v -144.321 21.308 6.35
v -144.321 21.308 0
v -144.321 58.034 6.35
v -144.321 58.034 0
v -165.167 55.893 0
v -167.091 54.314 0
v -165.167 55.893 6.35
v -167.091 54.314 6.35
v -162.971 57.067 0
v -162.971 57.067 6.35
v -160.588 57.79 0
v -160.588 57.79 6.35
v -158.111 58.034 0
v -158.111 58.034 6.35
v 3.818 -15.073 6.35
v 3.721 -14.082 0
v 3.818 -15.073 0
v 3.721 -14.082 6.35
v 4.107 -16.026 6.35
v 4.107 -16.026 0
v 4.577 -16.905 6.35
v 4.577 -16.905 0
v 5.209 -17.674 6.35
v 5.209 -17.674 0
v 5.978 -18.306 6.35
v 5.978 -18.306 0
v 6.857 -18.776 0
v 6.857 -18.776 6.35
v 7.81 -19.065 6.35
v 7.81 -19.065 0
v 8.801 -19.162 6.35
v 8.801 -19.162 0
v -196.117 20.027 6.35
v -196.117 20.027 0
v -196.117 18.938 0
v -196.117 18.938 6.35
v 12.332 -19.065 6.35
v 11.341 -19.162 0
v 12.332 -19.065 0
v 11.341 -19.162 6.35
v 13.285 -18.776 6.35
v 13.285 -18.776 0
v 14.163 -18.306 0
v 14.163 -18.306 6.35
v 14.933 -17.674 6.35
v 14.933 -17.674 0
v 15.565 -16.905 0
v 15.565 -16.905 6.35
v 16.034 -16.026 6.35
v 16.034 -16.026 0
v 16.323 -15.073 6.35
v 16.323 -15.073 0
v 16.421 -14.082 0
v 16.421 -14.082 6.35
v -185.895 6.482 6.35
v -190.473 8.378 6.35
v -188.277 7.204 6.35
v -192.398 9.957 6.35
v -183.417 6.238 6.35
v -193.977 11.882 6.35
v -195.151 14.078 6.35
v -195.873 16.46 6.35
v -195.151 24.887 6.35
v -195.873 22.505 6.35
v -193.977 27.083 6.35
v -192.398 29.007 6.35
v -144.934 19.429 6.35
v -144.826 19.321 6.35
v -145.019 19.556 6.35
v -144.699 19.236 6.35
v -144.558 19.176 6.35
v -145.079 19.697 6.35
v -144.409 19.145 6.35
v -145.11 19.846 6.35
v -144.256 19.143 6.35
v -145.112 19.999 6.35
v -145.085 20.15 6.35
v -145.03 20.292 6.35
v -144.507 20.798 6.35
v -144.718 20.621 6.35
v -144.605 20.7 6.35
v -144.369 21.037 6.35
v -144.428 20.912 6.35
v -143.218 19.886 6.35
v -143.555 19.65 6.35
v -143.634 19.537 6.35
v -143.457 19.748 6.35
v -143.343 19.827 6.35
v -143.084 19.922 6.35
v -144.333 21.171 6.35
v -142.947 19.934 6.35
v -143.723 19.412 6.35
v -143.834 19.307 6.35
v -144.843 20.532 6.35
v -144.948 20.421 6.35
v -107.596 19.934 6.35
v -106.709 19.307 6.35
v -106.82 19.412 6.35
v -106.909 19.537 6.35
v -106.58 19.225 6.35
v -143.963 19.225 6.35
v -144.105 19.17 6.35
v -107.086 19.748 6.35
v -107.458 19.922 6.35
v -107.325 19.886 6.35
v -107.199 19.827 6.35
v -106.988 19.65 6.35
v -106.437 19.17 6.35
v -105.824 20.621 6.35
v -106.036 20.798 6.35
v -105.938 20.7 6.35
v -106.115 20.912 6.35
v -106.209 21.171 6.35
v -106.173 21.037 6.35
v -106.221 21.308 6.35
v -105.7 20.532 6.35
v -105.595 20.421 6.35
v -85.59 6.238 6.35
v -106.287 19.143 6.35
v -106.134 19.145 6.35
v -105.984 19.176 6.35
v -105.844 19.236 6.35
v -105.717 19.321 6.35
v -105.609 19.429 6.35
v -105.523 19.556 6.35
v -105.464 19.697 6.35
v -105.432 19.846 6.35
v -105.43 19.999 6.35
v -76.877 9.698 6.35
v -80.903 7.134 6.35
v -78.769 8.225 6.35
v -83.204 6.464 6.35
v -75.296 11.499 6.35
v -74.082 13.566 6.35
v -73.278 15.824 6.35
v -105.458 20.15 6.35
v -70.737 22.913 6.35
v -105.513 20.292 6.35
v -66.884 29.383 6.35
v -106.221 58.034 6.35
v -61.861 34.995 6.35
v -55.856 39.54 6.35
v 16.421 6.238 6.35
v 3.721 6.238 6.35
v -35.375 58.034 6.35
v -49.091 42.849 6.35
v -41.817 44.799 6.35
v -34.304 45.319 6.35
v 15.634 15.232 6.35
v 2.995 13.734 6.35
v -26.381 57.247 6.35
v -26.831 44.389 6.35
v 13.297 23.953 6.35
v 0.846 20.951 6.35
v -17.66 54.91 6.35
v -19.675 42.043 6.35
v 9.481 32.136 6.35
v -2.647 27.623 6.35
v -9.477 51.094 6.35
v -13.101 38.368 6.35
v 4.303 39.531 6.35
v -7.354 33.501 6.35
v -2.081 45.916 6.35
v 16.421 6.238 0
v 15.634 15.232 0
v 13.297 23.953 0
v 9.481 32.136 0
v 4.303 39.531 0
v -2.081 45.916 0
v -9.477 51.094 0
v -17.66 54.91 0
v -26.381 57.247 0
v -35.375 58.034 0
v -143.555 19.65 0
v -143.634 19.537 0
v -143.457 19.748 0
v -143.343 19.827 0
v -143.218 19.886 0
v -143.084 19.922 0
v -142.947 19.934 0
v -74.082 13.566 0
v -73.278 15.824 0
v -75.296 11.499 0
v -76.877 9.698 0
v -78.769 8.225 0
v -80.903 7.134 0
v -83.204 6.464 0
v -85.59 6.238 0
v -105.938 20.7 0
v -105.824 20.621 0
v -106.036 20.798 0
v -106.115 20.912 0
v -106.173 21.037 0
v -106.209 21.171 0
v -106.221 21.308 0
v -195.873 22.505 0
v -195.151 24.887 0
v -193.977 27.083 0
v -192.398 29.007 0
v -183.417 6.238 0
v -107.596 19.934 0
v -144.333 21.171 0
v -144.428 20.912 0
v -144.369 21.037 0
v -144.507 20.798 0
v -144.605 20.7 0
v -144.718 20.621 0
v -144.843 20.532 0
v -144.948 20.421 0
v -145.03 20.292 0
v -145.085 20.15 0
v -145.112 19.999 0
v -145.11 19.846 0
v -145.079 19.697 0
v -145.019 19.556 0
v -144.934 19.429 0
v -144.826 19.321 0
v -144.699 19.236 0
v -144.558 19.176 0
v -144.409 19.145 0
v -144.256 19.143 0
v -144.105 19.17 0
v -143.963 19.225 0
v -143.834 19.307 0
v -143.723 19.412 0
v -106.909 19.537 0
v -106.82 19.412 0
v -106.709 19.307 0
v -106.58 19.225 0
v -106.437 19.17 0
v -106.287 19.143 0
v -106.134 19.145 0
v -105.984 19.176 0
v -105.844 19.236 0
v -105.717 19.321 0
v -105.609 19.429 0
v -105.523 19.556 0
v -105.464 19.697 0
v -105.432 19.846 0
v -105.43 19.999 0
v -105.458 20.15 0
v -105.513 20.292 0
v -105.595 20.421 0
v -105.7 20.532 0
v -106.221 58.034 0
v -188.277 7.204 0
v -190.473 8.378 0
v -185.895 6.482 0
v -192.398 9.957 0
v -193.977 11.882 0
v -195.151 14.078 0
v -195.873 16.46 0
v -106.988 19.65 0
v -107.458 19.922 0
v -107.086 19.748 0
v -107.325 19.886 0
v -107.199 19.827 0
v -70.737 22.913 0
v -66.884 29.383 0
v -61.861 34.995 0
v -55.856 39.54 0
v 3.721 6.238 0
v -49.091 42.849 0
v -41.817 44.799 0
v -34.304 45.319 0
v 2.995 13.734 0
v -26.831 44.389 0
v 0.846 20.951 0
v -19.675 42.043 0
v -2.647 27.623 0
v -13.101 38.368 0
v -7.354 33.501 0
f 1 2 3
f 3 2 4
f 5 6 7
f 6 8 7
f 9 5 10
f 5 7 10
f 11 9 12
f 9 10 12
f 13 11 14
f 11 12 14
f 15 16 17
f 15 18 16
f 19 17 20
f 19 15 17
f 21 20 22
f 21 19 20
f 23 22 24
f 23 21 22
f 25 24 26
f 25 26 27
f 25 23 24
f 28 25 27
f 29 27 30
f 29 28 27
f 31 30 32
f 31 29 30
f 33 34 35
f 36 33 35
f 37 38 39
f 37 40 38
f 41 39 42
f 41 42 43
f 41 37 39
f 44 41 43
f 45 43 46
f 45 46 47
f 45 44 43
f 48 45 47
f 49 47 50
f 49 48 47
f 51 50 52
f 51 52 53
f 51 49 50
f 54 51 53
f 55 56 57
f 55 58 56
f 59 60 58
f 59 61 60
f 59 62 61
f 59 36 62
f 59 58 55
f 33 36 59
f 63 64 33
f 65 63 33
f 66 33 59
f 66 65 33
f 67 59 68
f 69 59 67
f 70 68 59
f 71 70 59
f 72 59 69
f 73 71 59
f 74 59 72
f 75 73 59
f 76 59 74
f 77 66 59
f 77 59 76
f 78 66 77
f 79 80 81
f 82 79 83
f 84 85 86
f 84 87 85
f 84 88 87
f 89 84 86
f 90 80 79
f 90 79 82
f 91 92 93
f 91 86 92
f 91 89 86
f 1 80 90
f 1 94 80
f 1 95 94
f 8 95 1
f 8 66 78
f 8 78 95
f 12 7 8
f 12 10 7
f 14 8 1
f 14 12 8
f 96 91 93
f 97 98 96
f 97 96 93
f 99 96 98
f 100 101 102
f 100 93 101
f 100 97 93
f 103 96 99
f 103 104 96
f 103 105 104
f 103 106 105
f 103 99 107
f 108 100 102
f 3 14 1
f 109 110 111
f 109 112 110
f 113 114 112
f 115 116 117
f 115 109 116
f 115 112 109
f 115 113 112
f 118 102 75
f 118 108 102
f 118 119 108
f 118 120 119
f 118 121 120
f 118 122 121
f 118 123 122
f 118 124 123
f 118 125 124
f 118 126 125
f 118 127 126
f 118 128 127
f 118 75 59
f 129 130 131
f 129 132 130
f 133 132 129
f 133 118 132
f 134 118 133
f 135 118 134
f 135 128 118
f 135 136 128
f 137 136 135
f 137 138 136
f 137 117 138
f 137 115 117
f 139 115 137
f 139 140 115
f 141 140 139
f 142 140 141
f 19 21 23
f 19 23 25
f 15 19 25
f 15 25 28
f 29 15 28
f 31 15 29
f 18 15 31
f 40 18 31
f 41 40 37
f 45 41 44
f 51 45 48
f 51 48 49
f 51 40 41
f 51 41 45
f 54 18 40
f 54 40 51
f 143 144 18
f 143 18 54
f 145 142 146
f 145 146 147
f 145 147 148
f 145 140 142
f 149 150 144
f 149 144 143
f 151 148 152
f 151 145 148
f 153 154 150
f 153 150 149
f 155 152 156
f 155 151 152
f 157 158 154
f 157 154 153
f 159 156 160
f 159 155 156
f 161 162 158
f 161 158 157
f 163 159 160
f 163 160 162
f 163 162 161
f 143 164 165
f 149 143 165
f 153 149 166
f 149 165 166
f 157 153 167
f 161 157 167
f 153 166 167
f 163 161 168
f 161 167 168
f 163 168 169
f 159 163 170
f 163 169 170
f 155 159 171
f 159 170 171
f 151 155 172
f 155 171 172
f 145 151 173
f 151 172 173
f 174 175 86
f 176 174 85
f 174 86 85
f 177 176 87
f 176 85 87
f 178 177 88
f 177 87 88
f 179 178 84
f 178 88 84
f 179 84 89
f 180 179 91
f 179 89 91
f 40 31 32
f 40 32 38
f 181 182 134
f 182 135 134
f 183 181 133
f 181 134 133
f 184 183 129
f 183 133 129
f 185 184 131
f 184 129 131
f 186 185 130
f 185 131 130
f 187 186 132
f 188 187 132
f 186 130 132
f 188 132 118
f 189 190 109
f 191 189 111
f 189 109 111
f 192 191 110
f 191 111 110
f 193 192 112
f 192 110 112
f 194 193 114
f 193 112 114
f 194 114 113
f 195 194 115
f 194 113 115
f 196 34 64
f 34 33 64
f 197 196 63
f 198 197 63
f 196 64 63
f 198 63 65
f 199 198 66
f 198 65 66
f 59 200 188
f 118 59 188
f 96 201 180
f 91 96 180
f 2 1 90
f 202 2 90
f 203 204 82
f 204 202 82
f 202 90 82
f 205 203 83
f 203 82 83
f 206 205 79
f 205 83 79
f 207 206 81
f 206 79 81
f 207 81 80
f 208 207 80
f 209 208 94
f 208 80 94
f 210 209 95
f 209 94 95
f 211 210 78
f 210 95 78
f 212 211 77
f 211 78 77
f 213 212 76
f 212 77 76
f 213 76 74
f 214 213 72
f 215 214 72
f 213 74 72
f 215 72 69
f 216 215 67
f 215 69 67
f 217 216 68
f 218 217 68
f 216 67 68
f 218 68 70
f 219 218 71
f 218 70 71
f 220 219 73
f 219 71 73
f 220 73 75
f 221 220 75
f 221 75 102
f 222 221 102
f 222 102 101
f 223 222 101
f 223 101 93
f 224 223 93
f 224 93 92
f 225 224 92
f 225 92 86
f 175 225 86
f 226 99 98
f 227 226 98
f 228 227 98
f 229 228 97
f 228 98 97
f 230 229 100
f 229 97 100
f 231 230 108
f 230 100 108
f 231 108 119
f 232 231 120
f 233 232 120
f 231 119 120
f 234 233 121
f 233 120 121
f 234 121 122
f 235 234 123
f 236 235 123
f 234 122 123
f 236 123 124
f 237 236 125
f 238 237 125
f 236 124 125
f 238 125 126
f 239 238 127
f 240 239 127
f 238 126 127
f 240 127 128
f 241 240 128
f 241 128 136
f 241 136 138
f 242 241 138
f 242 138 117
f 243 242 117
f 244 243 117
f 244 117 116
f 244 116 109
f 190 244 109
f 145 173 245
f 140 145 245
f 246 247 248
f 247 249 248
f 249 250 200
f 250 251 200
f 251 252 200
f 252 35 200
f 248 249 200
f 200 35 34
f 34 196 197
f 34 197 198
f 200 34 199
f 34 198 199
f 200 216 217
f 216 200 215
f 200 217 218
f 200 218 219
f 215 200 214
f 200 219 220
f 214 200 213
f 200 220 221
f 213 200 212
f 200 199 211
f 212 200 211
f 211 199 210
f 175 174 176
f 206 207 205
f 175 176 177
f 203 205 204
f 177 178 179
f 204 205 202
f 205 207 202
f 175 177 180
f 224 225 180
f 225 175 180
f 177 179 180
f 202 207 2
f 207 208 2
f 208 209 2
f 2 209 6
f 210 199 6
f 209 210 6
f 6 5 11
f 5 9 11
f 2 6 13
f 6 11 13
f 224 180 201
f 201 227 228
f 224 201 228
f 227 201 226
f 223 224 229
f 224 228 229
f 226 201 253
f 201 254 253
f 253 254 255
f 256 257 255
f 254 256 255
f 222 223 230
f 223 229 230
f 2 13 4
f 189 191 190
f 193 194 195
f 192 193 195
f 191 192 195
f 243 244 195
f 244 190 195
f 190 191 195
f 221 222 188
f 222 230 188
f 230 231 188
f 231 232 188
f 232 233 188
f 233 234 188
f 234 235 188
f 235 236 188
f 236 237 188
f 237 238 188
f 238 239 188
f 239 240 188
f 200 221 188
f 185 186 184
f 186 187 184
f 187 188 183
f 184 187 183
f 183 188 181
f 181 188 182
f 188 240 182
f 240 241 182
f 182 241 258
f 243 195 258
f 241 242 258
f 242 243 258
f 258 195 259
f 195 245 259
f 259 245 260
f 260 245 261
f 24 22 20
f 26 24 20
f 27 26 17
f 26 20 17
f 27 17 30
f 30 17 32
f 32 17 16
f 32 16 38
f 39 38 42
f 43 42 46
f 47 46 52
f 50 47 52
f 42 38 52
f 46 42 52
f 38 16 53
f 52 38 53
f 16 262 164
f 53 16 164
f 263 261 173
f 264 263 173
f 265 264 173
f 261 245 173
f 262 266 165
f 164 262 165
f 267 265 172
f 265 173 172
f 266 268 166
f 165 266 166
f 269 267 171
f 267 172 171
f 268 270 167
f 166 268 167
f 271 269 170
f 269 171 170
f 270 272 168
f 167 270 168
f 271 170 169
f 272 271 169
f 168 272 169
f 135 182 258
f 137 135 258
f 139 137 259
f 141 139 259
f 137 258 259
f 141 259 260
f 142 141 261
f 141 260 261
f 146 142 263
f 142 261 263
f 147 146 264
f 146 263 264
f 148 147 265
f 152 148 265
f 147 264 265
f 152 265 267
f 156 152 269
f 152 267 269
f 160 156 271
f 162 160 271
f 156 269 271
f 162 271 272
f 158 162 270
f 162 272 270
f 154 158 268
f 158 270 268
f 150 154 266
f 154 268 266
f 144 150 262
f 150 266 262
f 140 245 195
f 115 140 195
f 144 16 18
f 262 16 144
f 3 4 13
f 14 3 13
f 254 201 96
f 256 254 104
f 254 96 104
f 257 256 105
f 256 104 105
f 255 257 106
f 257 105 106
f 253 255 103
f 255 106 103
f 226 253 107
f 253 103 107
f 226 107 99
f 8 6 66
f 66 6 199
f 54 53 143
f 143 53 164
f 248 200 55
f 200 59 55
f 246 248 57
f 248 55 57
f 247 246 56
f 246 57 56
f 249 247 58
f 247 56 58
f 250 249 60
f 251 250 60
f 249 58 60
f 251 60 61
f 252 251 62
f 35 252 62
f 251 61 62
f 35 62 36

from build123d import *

# Parameters (mm, degrees)
F0_W     = 12.7
F0_H     = 25.4
F1_DEPTH = 6.35
F2_R     = 5.08
F3_R     = 12.7
F5_DEPTH = 6.351


with BuildPart() as f1:
    # F0 (on Top) → F1 (new body)
    with BuildSketch(Plane.XY):
        with BuildLine():
            Line((-87.171328, 6.23762), (-74.471328, 6.23762))
            ThreePointArc((-74.471328, 6.23762), (-35.375303, 45.333645), (3.720721, 6.23762))
            Line((3.720721, 6.23762), (16.420721, 6.23762))
            ThreePointArc((16.420721, 6.23762), (1.250017, 42.862941), (-35.375303, 58.033645))
            Line((-35.375303, 58.033645), (-106.221328, 58.033645))
            Line((-106.221328, 58.033645), (-106.221328, 19.933645))
            Line((-106.221328, 19.933645), (-144.321328, 19.933645))
            Line((-144.321328, 19.933645), (-144.321328, 58.033645))
            Line((-144.321328, 58.033645), (-163.371328, 58.033645))
            Line((-163.371328, 58.033645), (-196.117352, 25.28762))
            Line((-196.117352, 25.28762), (-196.117352, 6.23762))
            Line((-196.117352, 6.23762), (-87.171328, 6.23762))
        make_face()
        with Locations((10.070721, -6.46238)):
            Rectangle(F0_W, F0_H)
    extrude(amount=F1_DEPTH)

    # F2
    f2_edges = [f1.edges().sort_by_distance(p)[0] for p in [
        (16.420721, -19.16238, 3.175),
        (3.720721, -19.16238, 3.175),
    ]]
    fillet(f2_edges, radius=F2_R)

    # F3
    f3_edges = [f1.edges().sort_by_distance(p)[0] for p in [
        (-74.471328, 6.23762, 3.175),
        (-196.117352, 25.28762, 3.175),
        (-163.371328, 58.033645, 3.175),
        (-196.117352, 6.23762, 3.175),
    ]]
    fillet(f3_edges, radius=F3_R)

    # F4 (on face) → F5 (cut, through all)
    with BuildSketch(Plane.XY.offset(6.35)):
        with BuildLine():
            ThreePointArc((-144.321328, 21.30846), (-144.42767, 20.911585), (-144.718203, 20.621053))
            ThreePointArc((-144.718203, 20.621053), (-144.882594, 19.372379), (-143.63392, 19.53677))
            ThreePointArc((-143.63392, 19.53677), (-143.343388, 19.827303), (-142.946513, 19.933645))
            Line((-142.946513, 19.933645), (-144.321328, 21.30846))
        make_face()
        with BuildLine():
            ThreePointArc((-105.824453, 20.621053), (-106.114986, 20.911585), (-106.221328, 21.30846))
            Line((-106.221328, 21.30846), (-107.596143, 19.933645))
            ThreePointArc((-107.596143, 19.933645), (-107.199268, 19.827303), (-106.908736, 19.53677))
            ThreePointArc((-106.908736, 19.53677), (-105.660062, 19.372379), (-105.824453, 20.621053))
        make_face()
    extrude(amount=-F5_DEPTH, mode=Mode.SUBTRACT)


solid = f1.part
